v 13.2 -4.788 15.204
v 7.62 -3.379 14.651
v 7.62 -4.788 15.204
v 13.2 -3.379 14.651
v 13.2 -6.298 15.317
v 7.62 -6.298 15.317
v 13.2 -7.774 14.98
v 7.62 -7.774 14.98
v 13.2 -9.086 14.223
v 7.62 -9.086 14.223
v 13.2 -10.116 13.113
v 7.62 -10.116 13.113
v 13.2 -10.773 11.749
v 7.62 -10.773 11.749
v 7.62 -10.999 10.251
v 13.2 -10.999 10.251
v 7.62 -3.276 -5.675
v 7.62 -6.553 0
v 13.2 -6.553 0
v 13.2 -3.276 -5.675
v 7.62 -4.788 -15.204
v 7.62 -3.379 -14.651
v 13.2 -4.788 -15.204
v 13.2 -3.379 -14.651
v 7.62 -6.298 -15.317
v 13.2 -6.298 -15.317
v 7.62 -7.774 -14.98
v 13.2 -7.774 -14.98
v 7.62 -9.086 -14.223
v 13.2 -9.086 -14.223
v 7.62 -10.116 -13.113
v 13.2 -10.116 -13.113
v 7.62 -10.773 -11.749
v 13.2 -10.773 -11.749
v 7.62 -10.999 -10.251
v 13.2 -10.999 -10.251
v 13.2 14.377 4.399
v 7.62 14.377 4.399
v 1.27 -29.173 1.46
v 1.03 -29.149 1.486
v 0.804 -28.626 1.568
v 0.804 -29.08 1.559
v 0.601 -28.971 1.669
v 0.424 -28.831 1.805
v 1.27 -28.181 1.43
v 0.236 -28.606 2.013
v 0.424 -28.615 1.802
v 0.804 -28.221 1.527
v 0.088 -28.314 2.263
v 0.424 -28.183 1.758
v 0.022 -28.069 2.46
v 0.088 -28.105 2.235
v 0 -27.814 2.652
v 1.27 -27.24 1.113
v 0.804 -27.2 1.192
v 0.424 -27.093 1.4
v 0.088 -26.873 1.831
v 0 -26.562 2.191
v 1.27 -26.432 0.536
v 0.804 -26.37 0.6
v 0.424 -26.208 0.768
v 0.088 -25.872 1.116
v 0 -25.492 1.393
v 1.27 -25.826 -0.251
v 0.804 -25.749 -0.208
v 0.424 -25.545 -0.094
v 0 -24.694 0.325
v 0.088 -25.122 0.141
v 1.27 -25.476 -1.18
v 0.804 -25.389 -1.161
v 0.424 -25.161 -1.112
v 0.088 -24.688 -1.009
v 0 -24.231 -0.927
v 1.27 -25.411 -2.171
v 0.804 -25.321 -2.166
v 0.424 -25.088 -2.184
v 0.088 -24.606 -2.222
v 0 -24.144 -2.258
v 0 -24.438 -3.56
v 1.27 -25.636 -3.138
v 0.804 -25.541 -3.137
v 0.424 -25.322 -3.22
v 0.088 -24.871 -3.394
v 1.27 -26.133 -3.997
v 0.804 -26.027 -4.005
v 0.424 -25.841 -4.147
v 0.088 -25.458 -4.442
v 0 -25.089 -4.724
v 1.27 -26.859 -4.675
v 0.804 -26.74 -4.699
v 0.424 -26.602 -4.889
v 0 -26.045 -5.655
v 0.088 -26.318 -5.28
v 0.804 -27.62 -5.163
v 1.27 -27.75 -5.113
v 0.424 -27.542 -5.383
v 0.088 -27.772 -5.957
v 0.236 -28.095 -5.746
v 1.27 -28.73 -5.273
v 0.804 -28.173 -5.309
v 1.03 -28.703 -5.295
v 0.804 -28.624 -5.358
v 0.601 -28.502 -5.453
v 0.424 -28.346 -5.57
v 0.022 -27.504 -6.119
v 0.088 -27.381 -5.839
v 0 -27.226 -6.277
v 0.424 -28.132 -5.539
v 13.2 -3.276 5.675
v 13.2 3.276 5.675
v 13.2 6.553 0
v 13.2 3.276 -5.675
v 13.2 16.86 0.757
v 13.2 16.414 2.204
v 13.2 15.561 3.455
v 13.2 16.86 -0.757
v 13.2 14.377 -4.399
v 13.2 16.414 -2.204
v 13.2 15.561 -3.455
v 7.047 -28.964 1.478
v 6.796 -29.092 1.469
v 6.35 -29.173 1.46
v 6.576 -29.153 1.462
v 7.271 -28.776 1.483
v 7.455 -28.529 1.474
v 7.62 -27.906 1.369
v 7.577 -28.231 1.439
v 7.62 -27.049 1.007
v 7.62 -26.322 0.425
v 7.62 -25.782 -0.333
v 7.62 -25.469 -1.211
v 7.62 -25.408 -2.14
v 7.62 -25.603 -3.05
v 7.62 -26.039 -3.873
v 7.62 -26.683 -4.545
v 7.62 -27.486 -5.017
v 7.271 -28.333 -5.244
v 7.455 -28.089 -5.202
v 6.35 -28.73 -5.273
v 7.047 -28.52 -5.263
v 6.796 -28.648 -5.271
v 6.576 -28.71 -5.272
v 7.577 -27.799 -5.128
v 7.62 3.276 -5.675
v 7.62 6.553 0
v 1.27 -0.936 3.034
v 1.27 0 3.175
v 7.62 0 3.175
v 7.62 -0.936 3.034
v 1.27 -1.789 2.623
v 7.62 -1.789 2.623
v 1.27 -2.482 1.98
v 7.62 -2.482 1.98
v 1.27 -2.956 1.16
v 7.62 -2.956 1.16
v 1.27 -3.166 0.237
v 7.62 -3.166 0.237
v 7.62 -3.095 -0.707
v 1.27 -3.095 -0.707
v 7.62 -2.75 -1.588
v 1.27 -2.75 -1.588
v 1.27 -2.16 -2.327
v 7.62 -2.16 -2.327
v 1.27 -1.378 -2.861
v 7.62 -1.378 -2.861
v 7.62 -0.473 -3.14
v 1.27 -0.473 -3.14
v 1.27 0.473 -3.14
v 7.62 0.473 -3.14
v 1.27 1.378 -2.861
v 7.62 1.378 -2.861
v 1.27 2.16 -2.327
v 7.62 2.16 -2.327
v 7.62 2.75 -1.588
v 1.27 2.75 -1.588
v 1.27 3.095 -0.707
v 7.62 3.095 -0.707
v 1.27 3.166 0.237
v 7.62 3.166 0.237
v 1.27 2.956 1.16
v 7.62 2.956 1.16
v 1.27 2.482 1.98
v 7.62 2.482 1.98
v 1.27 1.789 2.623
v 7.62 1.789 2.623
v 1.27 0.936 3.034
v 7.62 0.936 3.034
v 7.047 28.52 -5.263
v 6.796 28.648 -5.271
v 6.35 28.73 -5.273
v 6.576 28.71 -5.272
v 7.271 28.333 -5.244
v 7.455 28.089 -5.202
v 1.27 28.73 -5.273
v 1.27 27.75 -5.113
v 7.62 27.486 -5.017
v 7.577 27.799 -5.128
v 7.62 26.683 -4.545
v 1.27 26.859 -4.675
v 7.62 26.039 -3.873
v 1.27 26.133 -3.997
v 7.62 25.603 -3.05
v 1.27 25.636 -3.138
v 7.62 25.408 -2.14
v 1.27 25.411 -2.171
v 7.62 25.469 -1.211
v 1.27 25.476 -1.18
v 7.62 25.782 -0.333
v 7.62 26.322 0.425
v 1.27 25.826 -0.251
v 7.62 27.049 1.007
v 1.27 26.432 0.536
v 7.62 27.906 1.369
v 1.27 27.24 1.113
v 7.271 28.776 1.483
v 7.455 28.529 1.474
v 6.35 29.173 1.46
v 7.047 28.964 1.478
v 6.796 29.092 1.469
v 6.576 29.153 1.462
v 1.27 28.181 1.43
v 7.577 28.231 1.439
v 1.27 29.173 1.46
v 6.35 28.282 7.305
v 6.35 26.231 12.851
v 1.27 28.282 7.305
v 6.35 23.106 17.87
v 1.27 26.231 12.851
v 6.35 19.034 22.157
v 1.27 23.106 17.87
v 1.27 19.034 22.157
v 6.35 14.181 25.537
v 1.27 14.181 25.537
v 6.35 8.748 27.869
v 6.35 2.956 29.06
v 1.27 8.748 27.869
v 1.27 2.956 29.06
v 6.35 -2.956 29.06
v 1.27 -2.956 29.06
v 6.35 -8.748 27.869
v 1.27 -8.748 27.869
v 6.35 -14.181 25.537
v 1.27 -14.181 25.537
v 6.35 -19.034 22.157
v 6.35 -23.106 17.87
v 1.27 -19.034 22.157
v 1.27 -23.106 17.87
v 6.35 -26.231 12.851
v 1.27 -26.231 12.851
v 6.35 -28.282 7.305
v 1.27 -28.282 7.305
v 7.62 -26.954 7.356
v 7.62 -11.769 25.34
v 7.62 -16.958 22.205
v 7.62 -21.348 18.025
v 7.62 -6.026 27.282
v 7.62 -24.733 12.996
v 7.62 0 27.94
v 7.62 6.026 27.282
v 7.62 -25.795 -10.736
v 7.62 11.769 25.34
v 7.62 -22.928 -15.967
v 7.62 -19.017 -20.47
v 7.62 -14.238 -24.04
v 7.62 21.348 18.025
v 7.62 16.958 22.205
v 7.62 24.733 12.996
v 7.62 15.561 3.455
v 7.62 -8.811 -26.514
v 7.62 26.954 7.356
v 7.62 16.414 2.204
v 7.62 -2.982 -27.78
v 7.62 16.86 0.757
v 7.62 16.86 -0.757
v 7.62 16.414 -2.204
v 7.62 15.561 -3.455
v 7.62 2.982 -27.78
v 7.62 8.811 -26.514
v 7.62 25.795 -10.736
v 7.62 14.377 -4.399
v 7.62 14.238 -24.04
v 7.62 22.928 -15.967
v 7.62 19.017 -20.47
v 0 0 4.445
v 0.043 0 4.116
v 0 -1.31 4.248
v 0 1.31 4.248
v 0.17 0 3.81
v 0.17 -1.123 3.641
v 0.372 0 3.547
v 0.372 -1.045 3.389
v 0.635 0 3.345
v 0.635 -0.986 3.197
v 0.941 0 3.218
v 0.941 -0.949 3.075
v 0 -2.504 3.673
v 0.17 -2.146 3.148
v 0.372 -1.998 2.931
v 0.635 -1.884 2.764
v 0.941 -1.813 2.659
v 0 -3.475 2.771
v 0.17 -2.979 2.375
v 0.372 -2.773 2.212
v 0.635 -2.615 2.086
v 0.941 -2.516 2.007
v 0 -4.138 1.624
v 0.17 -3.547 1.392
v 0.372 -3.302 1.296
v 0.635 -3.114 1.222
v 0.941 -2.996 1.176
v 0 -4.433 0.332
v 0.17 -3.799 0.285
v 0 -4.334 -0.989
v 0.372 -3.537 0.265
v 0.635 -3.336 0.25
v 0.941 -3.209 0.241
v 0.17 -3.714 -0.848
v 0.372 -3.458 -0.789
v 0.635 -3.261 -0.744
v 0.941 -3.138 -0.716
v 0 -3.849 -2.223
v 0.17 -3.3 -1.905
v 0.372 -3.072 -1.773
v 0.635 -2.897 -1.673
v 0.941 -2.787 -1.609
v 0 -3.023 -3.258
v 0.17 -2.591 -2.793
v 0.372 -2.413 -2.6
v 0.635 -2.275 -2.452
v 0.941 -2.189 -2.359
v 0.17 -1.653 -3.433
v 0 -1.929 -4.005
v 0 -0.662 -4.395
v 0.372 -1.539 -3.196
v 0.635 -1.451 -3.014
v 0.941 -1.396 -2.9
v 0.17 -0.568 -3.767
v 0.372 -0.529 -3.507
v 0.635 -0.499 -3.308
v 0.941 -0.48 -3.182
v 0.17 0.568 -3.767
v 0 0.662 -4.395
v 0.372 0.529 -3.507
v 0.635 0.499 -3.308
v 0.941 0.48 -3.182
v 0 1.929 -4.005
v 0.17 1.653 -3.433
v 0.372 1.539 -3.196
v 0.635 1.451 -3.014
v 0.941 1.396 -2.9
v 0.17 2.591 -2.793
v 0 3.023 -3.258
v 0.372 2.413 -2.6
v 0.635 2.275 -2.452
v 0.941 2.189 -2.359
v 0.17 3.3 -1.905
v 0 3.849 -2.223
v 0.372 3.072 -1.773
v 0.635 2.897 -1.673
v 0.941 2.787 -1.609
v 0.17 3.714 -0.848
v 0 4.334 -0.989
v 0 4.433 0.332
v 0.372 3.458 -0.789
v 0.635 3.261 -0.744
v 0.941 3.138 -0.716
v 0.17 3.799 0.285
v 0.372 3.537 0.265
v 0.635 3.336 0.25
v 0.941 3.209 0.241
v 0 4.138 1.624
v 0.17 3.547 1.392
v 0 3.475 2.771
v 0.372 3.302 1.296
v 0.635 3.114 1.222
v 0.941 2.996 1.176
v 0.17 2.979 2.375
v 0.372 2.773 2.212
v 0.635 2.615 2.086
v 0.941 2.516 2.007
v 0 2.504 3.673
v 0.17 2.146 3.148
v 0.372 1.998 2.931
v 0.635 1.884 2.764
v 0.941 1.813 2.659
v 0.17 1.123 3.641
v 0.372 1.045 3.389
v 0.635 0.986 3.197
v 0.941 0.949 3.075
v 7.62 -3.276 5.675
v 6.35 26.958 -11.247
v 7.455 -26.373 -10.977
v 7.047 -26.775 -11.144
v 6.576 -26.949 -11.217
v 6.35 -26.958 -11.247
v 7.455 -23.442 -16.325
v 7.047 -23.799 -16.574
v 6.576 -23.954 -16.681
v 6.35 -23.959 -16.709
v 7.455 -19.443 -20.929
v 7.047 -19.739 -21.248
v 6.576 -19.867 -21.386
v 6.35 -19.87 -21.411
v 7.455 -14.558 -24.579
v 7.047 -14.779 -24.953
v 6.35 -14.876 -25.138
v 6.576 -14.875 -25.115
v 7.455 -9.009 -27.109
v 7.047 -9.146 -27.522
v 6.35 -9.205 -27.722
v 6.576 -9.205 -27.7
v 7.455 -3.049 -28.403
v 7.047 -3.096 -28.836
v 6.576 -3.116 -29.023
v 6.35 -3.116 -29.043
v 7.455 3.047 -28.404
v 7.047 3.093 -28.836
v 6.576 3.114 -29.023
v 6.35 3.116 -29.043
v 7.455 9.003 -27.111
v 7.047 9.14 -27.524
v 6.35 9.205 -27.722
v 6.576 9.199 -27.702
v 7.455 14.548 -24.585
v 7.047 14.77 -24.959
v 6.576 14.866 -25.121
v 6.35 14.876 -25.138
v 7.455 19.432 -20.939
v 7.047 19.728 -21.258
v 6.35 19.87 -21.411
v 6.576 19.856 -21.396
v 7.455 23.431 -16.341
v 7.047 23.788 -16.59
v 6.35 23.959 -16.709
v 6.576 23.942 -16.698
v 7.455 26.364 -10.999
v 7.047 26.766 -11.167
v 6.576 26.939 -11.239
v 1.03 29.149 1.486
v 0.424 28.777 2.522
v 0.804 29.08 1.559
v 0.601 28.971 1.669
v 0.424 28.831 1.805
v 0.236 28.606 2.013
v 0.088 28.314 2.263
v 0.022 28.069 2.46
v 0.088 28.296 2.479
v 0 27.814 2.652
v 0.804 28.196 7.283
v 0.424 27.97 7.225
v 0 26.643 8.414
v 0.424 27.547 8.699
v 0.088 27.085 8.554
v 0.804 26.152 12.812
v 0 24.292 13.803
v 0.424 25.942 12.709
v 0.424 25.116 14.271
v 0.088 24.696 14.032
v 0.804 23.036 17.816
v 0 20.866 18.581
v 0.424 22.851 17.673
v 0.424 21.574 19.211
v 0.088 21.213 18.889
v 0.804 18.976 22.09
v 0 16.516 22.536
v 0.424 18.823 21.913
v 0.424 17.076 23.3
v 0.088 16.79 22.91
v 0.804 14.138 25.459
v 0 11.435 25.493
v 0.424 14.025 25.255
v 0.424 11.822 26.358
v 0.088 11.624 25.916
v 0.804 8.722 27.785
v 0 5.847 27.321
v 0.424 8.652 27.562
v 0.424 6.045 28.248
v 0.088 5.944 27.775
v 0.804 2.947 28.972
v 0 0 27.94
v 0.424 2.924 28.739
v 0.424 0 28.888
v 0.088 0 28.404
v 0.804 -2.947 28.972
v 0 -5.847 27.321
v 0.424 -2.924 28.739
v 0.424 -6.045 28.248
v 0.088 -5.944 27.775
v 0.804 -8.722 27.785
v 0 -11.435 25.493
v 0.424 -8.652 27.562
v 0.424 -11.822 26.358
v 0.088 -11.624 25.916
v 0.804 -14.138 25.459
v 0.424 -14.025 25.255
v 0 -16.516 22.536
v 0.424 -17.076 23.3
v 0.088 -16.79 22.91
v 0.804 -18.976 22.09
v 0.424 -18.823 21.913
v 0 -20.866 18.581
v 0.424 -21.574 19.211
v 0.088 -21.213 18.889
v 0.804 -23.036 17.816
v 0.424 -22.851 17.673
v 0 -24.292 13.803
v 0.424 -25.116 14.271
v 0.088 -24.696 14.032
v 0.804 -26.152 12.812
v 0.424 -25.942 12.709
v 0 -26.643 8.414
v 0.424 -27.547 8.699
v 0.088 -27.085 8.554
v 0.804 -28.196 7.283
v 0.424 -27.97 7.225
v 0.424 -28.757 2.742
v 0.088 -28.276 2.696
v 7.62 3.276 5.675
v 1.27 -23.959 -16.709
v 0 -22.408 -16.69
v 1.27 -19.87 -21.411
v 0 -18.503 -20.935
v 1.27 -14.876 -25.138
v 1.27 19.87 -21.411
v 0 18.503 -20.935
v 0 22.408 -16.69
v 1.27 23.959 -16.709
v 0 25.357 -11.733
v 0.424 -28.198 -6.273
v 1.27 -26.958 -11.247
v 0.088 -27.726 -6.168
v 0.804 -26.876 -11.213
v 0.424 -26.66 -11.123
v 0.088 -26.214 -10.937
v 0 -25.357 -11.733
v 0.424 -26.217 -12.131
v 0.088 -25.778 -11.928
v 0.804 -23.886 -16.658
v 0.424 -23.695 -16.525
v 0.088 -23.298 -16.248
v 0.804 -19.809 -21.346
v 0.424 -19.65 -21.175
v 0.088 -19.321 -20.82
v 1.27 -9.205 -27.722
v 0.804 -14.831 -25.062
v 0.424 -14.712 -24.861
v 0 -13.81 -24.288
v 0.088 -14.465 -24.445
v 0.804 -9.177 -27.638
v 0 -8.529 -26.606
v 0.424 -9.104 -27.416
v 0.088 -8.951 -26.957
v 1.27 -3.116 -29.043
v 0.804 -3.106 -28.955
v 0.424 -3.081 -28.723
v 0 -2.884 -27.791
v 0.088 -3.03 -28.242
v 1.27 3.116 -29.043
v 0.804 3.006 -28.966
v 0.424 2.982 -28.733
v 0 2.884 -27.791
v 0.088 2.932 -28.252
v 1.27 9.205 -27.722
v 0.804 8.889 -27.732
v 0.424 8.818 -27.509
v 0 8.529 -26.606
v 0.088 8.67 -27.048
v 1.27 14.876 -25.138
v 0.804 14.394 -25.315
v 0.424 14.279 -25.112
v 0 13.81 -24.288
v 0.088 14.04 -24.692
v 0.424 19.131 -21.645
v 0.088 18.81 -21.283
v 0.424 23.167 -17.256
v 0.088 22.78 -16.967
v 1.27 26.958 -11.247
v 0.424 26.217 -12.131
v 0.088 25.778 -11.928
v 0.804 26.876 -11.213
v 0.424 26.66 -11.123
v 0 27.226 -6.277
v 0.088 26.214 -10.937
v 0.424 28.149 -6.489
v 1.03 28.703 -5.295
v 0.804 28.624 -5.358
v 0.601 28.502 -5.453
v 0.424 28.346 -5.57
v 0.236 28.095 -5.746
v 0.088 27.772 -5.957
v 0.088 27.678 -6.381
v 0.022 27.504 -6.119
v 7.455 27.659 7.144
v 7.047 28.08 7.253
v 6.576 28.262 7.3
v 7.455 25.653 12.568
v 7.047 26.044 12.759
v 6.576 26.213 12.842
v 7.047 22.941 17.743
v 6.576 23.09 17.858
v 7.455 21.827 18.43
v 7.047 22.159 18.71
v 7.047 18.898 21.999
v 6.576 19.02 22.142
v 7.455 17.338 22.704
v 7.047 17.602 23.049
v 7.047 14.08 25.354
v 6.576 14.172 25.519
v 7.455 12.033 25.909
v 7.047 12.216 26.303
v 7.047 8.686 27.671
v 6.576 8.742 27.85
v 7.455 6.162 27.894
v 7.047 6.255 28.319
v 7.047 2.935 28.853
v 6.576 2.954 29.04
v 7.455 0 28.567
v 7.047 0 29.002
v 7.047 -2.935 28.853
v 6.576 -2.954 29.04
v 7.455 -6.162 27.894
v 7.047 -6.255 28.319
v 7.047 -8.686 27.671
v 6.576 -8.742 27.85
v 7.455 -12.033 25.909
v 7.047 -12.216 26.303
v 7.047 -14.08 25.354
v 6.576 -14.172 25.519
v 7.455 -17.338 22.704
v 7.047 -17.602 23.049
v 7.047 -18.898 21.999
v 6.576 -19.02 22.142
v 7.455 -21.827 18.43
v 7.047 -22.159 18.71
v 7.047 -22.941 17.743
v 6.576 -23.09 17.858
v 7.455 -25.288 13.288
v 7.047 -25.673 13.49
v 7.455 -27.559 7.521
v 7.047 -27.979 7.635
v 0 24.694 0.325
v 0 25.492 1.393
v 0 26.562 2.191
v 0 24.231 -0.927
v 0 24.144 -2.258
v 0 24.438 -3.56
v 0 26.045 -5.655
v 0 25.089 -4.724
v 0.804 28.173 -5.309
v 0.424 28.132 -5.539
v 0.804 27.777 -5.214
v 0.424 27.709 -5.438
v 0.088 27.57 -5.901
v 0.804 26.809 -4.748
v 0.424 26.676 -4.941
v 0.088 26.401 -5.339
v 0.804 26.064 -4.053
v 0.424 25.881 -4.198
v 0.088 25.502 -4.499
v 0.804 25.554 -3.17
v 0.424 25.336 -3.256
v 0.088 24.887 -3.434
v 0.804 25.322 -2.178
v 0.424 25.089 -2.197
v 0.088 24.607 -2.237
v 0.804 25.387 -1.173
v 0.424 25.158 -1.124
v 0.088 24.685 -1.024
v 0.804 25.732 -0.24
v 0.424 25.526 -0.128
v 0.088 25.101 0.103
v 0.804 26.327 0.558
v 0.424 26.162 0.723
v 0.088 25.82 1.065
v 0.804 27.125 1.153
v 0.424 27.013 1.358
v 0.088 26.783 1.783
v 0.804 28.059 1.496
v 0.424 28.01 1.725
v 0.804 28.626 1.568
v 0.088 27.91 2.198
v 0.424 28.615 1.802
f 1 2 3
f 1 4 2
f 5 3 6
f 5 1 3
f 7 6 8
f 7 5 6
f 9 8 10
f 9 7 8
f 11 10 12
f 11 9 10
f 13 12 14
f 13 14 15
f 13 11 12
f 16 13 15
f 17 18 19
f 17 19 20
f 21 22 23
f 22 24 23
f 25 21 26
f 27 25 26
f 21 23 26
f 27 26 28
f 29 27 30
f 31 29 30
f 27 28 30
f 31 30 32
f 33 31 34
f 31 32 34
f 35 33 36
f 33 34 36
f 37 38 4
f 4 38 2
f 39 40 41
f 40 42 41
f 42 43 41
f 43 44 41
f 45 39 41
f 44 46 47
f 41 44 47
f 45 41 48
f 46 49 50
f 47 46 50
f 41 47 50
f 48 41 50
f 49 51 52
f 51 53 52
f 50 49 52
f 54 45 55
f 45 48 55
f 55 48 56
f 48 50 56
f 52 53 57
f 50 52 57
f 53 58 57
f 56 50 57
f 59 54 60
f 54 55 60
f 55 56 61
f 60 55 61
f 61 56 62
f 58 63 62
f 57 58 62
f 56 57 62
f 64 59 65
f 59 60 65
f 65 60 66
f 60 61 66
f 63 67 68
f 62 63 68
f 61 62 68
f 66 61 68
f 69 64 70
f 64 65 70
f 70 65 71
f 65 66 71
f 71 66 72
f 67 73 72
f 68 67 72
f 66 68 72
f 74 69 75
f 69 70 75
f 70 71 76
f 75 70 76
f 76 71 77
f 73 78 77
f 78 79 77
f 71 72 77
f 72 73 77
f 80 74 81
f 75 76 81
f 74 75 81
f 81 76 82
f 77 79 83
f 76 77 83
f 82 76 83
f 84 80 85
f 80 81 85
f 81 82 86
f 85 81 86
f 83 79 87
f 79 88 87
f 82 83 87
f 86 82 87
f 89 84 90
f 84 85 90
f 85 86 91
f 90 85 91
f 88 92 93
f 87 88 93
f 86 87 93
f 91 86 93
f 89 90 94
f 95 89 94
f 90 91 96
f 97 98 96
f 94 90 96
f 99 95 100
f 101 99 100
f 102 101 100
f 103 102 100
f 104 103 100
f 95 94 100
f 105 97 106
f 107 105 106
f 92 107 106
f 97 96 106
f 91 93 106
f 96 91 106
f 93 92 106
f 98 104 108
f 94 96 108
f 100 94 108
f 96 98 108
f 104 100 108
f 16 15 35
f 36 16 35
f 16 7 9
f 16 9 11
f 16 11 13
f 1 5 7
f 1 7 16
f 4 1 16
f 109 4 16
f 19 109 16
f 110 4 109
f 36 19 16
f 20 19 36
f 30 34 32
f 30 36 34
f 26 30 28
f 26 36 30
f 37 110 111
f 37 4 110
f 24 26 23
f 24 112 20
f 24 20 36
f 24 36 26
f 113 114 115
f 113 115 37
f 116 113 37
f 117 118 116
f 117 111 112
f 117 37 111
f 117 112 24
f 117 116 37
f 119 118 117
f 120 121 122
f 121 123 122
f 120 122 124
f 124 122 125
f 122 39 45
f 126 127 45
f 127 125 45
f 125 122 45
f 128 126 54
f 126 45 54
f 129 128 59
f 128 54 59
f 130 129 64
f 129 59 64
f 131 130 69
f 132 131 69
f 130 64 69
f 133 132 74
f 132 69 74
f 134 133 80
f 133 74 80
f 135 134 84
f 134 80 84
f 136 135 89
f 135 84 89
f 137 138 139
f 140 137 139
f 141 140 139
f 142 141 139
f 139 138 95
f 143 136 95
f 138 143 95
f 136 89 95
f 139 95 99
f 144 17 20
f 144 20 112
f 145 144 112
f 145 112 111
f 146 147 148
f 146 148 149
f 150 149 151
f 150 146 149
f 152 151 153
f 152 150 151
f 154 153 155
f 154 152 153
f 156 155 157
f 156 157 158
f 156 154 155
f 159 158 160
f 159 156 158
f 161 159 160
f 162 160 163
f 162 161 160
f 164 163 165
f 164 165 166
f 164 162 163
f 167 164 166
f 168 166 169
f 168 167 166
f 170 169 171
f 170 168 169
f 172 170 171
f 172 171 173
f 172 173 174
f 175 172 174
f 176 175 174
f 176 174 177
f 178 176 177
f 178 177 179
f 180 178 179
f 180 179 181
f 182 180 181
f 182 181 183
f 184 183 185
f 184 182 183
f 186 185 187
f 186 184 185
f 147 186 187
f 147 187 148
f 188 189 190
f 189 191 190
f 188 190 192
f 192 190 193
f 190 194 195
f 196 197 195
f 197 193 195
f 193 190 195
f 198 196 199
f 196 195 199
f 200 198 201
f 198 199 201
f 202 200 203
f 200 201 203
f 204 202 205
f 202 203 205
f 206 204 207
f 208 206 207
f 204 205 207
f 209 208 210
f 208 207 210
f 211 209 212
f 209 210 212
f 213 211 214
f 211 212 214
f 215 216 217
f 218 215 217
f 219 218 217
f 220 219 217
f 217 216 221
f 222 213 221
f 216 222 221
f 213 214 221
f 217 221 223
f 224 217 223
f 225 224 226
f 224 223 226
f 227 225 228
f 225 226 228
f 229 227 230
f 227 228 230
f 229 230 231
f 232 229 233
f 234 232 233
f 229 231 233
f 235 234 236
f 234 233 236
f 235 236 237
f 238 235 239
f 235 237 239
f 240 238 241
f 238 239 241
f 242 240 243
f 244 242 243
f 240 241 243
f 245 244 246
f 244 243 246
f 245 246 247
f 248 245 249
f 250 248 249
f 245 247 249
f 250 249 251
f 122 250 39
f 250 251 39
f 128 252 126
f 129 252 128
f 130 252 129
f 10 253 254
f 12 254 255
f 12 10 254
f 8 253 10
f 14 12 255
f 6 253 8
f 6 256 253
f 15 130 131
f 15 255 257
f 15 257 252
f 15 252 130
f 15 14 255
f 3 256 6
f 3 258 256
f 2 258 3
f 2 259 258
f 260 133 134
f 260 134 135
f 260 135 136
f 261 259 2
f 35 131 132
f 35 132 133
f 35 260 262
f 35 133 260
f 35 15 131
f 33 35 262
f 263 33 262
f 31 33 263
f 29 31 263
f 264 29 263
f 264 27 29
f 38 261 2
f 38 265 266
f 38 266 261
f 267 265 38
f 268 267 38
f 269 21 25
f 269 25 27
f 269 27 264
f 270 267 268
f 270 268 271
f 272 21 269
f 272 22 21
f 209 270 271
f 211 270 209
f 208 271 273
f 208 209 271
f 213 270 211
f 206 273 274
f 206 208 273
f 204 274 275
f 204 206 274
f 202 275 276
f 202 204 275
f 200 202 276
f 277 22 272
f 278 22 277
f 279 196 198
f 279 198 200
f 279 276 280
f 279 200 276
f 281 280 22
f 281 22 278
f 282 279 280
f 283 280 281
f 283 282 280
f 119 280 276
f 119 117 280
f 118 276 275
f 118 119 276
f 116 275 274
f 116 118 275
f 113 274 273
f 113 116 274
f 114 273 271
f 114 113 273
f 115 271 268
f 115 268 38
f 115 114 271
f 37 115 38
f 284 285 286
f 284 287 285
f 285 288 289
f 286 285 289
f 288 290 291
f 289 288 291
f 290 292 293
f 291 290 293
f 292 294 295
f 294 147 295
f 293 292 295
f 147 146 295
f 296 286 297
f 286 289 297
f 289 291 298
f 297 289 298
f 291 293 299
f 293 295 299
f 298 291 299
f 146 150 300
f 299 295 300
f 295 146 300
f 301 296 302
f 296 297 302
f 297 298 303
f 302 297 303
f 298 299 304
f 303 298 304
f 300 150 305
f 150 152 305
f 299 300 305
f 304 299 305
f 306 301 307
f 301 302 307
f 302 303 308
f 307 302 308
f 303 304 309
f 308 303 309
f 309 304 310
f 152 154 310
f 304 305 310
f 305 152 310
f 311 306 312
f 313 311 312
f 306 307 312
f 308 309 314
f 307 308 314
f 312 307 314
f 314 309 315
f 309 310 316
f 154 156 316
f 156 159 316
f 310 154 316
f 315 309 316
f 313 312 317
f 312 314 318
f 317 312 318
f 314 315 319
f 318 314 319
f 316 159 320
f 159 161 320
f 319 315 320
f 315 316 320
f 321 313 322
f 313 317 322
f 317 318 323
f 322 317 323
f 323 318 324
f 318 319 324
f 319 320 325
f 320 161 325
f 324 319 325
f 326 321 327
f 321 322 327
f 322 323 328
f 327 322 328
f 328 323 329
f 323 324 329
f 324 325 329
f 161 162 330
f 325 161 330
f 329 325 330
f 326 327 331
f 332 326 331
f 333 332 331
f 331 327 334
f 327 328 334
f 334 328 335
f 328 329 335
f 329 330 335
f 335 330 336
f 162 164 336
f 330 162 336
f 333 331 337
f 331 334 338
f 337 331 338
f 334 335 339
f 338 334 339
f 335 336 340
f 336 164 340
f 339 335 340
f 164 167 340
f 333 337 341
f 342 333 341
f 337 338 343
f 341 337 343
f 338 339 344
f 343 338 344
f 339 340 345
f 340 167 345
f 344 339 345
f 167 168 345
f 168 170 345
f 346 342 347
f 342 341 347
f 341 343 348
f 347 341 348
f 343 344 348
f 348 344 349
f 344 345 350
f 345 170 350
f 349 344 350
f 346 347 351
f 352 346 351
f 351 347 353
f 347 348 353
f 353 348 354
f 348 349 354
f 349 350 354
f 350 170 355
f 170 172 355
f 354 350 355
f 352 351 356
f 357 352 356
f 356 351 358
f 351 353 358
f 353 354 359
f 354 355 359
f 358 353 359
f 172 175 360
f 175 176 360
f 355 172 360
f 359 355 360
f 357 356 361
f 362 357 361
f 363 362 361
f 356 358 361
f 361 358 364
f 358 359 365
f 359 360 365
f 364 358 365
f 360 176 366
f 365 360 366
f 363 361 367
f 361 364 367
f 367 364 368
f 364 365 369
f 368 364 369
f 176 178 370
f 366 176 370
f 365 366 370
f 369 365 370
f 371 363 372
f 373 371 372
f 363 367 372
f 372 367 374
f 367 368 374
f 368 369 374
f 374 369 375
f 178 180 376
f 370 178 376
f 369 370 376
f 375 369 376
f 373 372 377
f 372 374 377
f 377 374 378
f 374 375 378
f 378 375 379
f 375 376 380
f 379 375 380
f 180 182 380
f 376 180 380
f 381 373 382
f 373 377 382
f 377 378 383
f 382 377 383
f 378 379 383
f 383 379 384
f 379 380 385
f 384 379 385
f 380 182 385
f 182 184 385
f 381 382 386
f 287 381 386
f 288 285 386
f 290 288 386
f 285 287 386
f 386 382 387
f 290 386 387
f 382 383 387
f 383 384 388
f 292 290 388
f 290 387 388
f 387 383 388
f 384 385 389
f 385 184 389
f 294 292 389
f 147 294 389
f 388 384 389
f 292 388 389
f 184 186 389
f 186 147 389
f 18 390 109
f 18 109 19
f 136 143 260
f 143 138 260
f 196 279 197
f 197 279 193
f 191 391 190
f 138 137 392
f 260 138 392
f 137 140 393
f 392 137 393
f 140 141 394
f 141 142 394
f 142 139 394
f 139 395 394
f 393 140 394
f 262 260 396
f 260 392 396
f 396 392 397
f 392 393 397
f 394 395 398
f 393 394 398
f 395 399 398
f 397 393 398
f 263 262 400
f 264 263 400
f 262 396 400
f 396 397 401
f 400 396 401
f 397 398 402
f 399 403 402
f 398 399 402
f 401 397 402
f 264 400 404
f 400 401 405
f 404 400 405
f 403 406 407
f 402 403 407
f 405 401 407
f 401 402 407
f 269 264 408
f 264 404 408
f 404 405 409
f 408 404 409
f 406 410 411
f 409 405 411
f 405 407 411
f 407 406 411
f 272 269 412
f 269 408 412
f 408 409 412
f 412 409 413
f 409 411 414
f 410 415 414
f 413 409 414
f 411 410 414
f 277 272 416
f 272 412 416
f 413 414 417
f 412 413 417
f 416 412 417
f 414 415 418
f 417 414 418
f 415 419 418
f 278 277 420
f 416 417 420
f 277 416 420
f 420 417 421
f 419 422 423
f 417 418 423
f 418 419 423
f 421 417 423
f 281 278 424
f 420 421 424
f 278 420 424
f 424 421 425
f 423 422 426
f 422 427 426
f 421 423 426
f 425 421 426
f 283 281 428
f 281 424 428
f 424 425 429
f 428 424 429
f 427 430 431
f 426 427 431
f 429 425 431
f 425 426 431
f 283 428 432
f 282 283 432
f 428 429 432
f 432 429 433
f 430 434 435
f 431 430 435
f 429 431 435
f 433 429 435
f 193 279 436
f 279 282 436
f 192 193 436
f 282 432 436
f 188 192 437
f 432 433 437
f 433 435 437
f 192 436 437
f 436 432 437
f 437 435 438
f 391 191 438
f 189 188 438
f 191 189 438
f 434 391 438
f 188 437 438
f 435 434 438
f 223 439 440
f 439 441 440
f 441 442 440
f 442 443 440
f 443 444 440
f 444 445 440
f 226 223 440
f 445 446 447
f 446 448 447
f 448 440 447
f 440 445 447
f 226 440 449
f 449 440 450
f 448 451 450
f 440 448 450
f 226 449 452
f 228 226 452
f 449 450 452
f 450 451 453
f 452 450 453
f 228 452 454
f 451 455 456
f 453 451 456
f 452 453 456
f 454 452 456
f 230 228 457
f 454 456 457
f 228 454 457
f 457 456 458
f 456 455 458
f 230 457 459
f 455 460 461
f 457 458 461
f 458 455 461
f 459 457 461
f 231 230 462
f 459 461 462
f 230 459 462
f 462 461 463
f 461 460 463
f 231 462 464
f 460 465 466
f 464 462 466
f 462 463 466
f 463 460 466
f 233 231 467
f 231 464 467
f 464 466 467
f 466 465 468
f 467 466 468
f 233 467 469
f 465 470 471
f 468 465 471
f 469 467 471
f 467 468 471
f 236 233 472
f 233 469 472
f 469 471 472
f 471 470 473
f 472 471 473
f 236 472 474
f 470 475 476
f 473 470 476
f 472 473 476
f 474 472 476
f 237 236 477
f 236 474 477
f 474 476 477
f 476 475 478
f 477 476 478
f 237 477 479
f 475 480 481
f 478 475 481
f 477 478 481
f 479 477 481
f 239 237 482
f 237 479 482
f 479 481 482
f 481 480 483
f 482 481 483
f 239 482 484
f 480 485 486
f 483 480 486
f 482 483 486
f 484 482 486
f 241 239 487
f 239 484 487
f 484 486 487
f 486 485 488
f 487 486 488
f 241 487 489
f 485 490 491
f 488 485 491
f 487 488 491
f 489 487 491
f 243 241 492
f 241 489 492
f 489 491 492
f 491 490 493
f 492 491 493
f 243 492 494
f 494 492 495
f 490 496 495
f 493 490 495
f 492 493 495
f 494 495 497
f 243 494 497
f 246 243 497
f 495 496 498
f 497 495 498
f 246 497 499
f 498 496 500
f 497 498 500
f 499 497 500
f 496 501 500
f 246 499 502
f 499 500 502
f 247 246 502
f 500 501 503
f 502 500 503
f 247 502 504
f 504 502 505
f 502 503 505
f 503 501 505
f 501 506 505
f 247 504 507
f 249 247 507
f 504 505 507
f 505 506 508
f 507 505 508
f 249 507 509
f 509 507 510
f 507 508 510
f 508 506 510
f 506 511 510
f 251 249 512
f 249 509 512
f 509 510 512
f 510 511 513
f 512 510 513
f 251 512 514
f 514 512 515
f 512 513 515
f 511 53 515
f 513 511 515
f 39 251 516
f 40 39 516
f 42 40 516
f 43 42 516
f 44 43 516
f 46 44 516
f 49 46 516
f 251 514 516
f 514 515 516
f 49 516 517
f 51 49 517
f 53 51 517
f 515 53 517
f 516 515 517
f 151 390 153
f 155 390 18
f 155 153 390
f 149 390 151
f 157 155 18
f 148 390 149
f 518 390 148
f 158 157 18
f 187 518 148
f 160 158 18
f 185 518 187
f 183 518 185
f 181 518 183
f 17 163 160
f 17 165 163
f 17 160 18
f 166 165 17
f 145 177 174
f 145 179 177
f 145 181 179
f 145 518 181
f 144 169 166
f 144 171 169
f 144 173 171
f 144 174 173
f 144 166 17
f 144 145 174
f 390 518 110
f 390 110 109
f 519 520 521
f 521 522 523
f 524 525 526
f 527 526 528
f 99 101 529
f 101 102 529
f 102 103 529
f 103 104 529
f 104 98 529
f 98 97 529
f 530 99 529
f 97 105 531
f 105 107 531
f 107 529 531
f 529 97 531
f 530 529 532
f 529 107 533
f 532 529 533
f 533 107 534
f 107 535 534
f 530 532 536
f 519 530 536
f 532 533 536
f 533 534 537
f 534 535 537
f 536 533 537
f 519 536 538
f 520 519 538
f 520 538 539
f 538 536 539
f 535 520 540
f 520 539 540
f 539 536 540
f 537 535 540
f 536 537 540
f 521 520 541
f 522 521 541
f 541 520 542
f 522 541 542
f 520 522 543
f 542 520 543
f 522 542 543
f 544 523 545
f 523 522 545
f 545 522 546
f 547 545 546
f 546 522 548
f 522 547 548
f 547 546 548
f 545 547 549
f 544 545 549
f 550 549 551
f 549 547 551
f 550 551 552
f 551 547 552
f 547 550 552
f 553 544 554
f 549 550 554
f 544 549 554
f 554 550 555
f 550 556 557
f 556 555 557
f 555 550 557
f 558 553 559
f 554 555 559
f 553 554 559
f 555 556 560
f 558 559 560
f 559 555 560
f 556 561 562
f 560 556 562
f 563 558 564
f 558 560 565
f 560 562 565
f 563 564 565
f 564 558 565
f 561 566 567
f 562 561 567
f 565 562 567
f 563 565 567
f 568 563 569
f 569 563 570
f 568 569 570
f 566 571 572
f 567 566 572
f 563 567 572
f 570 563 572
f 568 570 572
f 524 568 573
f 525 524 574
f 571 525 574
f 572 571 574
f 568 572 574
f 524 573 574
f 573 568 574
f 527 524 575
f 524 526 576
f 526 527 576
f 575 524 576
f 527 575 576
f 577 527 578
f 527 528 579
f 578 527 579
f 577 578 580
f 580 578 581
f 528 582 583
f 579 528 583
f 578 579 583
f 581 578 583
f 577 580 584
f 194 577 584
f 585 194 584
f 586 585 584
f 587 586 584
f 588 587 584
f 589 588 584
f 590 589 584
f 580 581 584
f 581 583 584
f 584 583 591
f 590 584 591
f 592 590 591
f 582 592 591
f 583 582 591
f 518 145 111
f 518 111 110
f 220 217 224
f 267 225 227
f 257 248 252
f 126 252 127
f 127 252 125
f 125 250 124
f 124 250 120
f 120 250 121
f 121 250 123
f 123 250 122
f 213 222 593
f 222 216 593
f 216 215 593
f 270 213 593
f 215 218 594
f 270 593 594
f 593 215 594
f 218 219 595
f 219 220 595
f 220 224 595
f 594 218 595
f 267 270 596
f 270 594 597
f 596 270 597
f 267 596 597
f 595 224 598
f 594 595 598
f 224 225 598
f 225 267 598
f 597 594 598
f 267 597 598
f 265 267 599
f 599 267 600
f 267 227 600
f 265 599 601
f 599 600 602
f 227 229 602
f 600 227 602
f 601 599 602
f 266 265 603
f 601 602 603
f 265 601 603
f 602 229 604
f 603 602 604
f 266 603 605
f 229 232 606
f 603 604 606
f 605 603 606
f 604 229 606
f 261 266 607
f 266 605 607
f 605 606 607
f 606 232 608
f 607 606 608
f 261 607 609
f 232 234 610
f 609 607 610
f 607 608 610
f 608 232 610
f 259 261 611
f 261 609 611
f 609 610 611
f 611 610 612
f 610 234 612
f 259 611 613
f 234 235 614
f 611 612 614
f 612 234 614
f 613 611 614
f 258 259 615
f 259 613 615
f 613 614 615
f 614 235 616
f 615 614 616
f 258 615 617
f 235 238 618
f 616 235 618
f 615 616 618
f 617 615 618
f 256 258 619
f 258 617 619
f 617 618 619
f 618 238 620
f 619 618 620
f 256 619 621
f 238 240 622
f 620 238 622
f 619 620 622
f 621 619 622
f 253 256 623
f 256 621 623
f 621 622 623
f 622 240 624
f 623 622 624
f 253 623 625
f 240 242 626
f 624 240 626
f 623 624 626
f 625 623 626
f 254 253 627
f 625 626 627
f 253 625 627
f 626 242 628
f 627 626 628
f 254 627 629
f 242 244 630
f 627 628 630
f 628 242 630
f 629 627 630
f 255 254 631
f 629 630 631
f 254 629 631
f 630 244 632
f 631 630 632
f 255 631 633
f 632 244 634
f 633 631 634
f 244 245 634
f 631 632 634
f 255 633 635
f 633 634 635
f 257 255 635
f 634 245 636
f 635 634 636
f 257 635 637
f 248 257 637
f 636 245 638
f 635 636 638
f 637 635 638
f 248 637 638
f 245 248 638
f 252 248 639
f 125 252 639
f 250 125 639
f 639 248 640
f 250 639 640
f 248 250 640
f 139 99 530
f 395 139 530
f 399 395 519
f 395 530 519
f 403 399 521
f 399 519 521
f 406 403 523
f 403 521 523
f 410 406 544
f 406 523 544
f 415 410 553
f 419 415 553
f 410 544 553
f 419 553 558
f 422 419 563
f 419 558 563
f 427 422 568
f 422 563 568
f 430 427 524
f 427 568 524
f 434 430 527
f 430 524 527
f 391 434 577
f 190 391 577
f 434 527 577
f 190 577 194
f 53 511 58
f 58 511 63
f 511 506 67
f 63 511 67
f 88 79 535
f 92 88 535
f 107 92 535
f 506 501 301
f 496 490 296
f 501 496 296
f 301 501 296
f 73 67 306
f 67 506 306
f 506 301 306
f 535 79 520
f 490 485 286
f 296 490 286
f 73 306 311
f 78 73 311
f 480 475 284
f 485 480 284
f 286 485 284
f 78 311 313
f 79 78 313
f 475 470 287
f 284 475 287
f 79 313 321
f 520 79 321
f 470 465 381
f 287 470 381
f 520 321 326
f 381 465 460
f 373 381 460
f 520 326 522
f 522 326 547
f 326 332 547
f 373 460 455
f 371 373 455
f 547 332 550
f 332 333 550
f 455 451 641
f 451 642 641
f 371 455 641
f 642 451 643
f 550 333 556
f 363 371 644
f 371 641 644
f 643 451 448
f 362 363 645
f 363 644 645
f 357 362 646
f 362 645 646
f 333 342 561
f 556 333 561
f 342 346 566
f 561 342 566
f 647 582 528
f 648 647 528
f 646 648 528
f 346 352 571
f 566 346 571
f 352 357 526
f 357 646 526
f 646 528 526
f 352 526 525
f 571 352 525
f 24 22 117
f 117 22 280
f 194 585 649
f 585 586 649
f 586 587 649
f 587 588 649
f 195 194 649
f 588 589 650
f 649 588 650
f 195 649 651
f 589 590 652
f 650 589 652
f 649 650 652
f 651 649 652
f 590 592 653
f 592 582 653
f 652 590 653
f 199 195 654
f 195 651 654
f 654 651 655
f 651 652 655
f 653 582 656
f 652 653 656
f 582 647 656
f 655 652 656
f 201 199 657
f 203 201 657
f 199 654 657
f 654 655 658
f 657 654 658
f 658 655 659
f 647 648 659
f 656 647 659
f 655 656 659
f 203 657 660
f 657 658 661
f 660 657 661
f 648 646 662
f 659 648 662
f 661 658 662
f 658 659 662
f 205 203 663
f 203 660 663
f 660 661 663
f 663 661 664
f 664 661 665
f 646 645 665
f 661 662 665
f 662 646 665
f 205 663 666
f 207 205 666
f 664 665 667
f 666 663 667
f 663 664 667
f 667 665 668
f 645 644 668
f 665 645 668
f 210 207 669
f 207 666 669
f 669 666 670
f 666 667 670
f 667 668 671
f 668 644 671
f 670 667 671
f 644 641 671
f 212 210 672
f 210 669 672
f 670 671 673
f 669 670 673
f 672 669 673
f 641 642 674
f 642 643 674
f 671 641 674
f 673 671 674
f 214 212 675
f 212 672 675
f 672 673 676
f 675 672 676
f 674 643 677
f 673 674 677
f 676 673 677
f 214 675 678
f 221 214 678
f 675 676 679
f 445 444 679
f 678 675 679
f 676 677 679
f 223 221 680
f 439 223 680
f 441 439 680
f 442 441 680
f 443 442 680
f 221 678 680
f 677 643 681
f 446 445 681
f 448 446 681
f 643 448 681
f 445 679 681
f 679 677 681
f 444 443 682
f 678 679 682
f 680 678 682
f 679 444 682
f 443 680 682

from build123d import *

# Parameters (mm, degrees)
SKETCH2_R           = 3.175
BOSS_EXTRUDE1_DEPTH = 7.62
BOSS_EXTRUDE2_DEPTH = 5.58
FILLET1_R           = 5.08
FILLET3_R           = 1.27


with BuildPart() as part:
    # Sketch2 → Boss-Extrude1 (new body)
    with BuildSketch(Plane(origin=(0, 0, 0), x_dir=(0, 0, -1), z_dir=(1, 0, 0))):
        with BuildLine():
            ThreePointArc((5.27282783, -28.730147697), (29.21, 0), (5.27282783, 28.730147697))
            ThreePointArc((5.27282783, 28.730147697), (1.672991049, 25.406627776), (-1.459953812, 29.17349199))
            ThreePointArc((-1.459953812, 29.17349199), (-29.21, 0), (-1.459953812, -29.17349199))
            ThreePointArc((-1.459953812, -29.17349199), (1.672991049, -25.406627776), (5.27282783, -28.730147697))
        make_face()
        with Locations(Location((0, 0, 0), (0, 0, 180))):
            Circle(SKETCH2_R, mode=Mode.SUBTRACT)
    extrude(amount=BOSS_EXTRUDE1_DEPTH)

    # Sketch3 → Boss-Extrude2 (add)
    with BuildSketch(Plane(origin=(7.62, 0, 0), x_dir=(0, 0, -1), z_dir=(1, 0, 0))):
        Polygon((19.05, -10.998522628), (0, 21.997045256), (-19.05, -10.998522628), align=None)
        Polygon((-5.675, 3.276462778), (-5.675, -3.276462778), (0, -6.552925555), (5.675, -3.276462778), (5.675, 3.276462778), (0, 6.552925555), align=None, mode=Mode.SUBTRACT)
    extrude(amount=BOSS_EXTRUDE2_DEPTH)

    # Fillet1
    fillet1_edges = [part.edges().sort_by_distance(p)[0] for p in [
        (10.41, -10.998522628, 19.05),
        (10.41, -10.998522628, -19.05),
        (10.41, 21.997045256, 0),
    ]]
    fillet(fillet1_edges, radius=FILLET1_R)

    # Fillet3
    fillet3_edges = [part.edges().sort_by_distance(p)[0] for p in [
        (0, 0, -3.175),
        (7.62, 0, -29.21),
        (7.62, 0, 29.21),
        (0, 25.406627776, -1.672991049),
        (0, 0, -29.21),
        (0, -25.406627776, -1.672991049),
        (0, 0, 29.21),
    ]]
    fillet(fillet3_edges, radius=FILLET3_R)


solid = part.part
